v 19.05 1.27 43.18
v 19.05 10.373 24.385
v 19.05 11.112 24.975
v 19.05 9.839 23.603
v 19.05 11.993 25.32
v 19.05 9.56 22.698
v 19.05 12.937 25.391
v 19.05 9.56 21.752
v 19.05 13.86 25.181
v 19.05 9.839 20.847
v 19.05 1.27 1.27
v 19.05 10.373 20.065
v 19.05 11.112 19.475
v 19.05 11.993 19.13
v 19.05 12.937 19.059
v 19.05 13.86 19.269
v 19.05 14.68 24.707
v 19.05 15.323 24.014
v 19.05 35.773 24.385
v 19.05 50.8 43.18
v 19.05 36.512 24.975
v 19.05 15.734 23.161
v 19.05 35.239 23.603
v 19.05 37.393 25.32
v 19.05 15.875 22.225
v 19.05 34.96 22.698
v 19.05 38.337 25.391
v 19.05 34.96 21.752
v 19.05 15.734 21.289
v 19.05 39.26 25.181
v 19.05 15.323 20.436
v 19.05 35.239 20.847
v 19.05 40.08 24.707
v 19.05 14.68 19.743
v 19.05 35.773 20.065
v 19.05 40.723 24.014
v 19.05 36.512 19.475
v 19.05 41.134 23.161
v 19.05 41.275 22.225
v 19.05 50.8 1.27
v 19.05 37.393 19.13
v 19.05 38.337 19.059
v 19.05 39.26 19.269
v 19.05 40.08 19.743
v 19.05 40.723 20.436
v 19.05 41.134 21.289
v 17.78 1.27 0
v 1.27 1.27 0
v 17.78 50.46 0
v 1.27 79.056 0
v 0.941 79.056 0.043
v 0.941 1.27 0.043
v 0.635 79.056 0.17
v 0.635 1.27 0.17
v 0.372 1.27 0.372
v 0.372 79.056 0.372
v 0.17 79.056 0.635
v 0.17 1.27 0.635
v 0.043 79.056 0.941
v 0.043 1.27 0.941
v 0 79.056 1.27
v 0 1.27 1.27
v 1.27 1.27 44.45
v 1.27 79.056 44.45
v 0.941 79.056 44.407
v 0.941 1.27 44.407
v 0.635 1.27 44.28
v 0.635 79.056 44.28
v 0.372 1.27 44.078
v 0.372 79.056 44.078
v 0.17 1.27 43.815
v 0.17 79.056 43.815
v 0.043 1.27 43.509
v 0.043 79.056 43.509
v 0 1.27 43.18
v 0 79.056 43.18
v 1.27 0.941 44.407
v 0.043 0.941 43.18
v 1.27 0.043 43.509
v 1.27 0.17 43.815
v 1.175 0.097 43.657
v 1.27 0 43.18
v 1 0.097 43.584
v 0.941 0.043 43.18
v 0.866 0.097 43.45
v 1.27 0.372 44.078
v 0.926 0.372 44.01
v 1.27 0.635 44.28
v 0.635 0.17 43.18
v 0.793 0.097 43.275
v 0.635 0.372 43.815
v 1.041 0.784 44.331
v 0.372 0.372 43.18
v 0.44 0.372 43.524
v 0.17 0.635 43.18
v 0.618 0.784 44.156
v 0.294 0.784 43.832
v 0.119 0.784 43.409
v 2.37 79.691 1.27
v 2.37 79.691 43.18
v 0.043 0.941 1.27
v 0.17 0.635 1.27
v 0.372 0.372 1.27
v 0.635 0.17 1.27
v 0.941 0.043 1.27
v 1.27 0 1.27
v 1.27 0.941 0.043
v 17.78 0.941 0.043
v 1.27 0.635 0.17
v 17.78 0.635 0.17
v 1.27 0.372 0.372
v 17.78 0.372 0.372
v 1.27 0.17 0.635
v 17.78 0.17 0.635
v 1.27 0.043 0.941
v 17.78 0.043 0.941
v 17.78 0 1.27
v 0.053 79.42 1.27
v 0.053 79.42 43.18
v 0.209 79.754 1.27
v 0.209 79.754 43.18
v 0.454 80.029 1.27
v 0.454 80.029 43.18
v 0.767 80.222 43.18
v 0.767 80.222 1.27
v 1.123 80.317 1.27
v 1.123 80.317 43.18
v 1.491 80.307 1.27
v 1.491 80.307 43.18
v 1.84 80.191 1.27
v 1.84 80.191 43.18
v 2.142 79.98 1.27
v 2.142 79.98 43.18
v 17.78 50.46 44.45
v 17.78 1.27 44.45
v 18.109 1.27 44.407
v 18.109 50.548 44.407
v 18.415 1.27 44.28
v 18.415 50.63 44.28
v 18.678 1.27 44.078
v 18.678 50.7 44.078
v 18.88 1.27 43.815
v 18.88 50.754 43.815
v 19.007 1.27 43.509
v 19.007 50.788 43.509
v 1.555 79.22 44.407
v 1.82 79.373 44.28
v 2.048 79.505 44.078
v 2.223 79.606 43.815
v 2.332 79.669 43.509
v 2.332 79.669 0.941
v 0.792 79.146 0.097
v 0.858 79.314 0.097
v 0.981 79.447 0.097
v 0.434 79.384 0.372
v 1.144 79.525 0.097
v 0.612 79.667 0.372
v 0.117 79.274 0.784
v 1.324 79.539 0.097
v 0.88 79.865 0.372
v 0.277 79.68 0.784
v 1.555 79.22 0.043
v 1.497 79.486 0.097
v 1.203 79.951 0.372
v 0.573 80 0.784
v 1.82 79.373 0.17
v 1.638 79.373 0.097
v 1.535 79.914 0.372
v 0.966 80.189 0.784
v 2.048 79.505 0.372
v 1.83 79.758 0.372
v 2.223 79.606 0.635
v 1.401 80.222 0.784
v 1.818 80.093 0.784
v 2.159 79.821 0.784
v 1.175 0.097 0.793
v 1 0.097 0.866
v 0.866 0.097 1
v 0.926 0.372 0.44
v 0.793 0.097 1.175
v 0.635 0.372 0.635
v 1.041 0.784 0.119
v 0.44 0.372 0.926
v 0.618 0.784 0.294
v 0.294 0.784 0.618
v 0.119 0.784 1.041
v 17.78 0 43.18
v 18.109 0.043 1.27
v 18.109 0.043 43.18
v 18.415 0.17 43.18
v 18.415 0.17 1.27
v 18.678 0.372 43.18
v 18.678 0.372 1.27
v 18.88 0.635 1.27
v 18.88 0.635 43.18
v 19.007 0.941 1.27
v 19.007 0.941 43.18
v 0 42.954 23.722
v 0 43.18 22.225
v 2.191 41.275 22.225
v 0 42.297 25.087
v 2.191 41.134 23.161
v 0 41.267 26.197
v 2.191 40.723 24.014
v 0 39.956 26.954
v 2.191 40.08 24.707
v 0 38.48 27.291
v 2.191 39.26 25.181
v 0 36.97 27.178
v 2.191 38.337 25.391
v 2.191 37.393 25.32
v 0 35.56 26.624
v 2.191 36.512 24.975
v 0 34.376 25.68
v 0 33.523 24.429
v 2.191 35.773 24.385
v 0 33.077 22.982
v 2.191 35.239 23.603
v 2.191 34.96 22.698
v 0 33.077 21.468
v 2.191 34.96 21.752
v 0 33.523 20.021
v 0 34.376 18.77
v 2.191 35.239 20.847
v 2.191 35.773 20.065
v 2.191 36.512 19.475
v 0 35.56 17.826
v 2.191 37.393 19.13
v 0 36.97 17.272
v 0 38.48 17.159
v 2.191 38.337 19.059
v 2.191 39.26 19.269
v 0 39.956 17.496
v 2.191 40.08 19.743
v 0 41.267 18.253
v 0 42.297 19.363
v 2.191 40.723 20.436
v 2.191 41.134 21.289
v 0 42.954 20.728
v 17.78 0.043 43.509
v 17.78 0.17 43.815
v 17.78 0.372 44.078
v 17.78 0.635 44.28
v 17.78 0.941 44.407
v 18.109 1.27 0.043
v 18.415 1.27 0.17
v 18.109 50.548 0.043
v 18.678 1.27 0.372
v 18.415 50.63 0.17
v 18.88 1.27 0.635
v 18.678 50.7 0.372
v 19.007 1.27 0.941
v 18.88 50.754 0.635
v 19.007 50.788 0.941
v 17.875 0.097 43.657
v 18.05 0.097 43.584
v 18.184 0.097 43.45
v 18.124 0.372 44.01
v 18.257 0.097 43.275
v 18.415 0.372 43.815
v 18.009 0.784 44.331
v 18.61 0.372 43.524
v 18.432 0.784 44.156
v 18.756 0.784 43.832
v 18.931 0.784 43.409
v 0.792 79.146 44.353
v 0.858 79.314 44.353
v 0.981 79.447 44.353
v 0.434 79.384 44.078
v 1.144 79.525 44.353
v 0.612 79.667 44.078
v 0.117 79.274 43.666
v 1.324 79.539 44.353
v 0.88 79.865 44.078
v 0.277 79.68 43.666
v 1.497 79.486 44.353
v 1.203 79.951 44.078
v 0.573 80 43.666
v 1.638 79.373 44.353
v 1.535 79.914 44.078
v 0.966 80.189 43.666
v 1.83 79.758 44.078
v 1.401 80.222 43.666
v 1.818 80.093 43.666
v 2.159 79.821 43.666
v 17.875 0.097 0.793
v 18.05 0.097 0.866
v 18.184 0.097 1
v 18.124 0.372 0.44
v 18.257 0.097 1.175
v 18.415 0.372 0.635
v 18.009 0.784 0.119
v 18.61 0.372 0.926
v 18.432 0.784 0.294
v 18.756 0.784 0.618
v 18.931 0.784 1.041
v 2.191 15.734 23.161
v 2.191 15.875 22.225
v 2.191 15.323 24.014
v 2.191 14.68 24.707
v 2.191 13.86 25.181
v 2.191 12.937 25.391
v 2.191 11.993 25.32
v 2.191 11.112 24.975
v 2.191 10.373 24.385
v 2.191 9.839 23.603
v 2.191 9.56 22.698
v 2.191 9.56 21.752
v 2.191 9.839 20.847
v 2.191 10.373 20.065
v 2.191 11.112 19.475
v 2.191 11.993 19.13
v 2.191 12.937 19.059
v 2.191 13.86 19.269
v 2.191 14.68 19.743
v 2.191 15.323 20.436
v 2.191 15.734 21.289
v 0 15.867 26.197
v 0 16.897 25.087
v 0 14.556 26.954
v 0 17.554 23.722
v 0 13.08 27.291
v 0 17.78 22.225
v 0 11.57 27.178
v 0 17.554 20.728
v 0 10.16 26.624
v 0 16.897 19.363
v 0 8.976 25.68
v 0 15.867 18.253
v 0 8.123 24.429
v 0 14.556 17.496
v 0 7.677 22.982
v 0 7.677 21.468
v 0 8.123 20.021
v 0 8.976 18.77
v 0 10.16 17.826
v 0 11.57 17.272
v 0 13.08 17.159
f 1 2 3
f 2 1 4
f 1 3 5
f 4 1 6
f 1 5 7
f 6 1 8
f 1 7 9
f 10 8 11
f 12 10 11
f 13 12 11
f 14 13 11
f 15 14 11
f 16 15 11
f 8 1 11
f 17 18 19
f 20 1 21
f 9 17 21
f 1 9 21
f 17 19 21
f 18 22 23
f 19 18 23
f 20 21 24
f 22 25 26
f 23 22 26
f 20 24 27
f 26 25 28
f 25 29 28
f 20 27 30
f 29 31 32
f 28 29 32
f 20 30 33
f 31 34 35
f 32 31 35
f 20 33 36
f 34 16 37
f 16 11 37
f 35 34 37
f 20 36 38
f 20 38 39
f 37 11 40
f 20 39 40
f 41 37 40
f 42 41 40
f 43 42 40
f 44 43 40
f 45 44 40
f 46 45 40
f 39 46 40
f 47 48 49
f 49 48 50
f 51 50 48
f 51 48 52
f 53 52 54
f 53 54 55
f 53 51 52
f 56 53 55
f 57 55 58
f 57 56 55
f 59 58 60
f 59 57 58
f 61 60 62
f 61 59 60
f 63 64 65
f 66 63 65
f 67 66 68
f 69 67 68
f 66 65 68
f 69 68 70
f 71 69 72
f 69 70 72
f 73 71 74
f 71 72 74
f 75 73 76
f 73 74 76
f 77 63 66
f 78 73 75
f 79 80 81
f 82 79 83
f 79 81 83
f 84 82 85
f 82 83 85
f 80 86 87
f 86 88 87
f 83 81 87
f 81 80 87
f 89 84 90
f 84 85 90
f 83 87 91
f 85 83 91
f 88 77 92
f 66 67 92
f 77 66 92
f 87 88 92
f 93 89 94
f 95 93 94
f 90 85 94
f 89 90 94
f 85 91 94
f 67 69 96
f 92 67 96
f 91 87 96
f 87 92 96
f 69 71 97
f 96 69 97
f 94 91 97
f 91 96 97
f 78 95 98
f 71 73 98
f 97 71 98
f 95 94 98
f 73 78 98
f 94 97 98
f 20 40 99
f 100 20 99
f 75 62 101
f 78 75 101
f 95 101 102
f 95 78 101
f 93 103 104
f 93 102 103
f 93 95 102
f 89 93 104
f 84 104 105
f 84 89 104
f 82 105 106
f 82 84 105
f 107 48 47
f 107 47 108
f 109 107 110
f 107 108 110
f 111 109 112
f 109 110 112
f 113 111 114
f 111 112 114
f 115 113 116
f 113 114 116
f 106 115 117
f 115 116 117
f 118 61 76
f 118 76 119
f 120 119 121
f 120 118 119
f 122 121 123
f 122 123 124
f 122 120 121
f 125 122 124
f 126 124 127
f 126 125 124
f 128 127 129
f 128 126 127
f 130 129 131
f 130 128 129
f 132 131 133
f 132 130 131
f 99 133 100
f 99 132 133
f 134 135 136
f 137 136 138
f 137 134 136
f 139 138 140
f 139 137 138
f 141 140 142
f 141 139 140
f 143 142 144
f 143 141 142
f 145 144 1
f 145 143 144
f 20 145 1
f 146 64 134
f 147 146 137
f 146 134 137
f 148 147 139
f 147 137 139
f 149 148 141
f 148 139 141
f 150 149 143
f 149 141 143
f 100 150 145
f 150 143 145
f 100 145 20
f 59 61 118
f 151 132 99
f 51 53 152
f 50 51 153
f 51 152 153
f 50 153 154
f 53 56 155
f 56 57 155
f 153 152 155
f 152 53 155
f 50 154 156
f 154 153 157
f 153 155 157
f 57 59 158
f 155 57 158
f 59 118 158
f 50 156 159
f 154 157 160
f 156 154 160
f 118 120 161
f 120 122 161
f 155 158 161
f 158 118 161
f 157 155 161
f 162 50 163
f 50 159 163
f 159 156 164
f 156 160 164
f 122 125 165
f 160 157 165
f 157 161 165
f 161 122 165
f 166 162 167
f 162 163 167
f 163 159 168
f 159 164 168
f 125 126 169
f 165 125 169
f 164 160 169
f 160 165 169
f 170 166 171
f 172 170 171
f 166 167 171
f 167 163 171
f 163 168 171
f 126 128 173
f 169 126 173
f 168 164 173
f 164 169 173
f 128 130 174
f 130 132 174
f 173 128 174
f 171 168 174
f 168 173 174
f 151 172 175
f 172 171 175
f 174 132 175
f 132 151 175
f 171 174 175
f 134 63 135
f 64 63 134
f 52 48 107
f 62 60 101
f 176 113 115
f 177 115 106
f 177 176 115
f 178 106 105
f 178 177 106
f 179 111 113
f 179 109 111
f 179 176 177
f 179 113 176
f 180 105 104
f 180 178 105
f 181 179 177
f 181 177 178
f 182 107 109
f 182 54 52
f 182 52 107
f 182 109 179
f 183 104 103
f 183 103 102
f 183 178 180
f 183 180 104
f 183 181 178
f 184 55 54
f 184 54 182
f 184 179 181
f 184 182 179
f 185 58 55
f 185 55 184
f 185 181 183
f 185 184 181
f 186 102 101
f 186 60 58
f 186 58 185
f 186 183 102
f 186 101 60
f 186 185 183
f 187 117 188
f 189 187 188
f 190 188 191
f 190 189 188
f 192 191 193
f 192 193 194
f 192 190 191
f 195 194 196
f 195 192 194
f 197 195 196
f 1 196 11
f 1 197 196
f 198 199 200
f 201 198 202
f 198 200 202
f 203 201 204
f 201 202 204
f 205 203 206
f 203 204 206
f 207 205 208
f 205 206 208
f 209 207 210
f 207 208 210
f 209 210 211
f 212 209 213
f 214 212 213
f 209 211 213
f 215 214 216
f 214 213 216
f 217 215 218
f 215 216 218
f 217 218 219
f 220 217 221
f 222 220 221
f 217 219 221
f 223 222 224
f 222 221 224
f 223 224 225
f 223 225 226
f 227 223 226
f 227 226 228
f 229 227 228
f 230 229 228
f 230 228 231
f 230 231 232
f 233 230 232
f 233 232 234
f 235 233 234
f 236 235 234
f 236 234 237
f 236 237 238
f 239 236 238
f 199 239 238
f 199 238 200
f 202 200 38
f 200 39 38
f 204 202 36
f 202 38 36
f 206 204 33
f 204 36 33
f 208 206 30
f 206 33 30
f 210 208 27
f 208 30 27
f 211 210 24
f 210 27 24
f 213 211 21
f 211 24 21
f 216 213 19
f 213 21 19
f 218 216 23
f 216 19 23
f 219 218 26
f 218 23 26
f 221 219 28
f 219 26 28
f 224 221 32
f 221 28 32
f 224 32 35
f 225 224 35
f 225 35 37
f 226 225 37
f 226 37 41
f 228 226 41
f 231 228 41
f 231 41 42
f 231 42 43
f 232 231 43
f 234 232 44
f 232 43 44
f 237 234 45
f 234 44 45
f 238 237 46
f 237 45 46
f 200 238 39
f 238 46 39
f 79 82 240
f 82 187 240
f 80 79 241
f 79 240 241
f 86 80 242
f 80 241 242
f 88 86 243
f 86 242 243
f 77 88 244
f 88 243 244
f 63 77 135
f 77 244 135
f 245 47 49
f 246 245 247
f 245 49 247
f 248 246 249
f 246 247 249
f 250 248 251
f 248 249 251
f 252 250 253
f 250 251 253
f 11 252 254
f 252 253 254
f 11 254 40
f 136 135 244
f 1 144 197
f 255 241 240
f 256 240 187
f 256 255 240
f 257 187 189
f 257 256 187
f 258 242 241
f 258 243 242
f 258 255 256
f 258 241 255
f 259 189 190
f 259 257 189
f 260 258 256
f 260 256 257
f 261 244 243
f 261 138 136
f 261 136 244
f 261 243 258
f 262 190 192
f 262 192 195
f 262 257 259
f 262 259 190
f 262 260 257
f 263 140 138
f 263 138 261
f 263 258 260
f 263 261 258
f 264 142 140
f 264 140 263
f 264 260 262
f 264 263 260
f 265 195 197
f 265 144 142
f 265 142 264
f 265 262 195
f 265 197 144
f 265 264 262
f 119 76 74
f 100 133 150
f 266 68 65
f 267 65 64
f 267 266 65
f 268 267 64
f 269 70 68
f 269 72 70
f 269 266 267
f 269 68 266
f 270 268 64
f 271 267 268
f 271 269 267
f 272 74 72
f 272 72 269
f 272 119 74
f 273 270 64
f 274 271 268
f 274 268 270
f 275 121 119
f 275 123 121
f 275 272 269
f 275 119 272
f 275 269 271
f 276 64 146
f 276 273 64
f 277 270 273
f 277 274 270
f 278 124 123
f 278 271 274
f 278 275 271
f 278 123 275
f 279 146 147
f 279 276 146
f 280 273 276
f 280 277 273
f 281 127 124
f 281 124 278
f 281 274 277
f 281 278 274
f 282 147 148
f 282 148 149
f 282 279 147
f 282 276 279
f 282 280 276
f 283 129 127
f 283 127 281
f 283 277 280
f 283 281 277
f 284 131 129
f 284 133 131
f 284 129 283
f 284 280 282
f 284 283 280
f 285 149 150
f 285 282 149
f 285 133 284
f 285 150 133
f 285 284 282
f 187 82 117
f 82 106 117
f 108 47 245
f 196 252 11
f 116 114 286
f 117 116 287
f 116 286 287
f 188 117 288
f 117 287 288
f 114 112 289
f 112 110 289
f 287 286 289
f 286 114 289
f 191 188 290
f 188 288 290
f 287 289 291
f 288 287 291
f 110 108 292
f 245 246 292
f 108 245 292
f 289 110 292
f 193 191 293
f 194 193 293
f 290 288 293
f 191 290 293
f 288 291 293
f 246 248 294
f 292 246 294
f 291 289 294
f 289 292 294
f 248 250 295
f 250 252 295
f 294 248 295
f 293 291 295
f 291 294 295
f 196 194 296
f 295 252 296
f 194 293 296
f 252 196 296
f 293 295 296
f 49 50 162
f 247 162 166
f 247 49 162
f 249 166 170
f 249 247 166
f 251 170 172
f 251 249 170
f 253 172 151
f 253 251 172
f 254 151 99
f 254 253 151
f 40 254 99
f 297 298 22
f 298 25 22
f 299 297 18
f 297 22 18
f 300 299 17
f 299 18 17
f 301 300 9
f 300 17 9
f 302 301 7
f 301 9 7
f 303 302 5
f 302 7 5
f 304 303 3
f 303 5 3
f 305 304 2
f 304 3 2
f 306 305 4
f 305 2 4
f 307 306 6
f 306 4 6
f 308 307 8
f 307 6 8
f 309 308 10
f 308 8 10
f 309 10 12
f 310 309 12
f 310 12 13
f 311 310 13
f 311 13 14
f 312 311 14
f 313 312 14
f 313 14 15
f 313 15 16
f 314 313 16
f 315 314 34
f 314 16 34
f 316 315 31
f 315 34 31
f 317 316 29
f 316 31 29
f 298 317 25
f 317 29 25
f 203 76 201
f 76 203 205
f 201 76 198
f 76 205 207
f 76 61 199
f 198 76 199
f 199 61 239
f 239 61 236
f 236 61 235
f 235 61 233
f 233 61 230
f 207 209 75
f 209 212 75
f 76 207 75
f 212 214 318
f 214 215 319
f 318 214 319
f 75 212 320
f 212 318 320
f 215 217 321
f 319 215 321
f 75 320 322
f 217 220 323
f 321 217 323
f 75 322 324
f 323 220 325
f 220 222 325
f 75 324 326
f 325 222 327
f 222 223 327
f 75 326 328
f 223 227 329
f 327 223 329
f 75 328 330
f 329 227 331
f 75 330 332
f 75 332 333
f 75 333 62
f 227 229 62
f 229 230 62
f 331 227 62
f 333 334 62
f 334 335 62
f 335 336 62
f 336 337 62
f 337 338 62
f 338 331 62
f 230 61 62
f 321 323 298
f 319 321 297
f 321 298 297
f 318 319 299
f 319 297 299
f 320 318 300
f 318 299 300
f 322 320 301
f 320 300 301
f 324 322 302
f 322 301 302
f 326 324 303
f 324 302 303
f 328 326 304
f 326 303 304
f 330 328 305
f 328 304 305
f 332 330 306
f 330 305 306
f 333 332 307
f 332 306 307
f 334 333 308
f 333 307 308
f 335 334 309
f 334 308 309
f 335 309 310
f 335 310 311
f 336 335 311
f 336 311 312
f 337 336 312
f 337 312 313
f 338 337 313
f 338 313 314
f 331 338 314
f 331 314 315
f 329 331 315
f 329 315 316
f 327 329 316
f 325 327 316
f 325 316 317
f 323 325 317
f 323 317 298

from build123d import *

# Parameters (mm, degrees)
F1_DEPTH       = 44.45
F3_D           = 6.35
F3_CSINK_D     = 10.16
F3_CSINK_ANGLE = 82
F4_T1_DEPTH    = 68.1485226281
F5_R           = 1.27


# Not quite as in the source:
# - a fillet or chamfer that OpenCascade refuses, or shapes differently, is made with other operations: its cross-section is extruded or revolved along the edge and cut away or added
# - a feature names something its author has since deleted; it is built from what else it names


with BuildPart() as f1:
    # F0 (on Top) → F1 (new body)
    with BuildSketch(Plane.XY):
        Polygon((0, 83.7955678842), (0, 0), (19.05, 0), (19.05, 50.8), align=None)
    extrude(amount=F1_DEPTH)

    # F3 (through all)
    with Locations(Plane(origin=(0, 0, 0), x_dir=(0, -1, 0), z_dir=(-1, 0, 0))):
        with Locations((-12.7, 22.225), (-38.1, 22.225)):
            CounterSinkHole(F3_D / 2, F3_CSINK_D / 2, counter_sink_angle=F3_CSINK_ANGLE)

    # F4: fillet of radius 1.27 on 1 edges, made by hand

    # F4_s2 → F4_t1 (cut)
    with BuildSketch(Plane.XY.offset(-11.849261314)):
        with BuildLine():
            ThreePointArc((0, 79.0558633586), (0.9412998127, 80.282589158), (2.3698522628, 79.6908633586))
            Line((2.3698522628, 79.6908633586), (0, 83.7955678842))
            Line((0, 83.7955678842), (0, 79.0558633586))
        make_face()
    extrude(amount=F4_T1_DEPTH, mode=Mode.SUBTRACT)

    # F5
    f5_edges = [f1.edges().sort_by_distance(p)[0] for p in [
        (0.9413, 80.282589, 44.45),
        (10.709926, 65.245432, 44.45),
        (19.05, 25.4, 44.45),
        (9.525, 0, 44.45),
        (0, 39.527932, 44.45),
        (0.9413, 80.282589, 0),
        (10.709926, 65.245432, 0),
        (19.05, 25.4, 0),
        (9.525, 0, 0),
        (0, 39.527932, 0),
        (0, 0, 22.225),
        (19.05, 0, 22.225),
    ]]
    fillet(f5_edges, radius=F5_R)


solid = f1.part
